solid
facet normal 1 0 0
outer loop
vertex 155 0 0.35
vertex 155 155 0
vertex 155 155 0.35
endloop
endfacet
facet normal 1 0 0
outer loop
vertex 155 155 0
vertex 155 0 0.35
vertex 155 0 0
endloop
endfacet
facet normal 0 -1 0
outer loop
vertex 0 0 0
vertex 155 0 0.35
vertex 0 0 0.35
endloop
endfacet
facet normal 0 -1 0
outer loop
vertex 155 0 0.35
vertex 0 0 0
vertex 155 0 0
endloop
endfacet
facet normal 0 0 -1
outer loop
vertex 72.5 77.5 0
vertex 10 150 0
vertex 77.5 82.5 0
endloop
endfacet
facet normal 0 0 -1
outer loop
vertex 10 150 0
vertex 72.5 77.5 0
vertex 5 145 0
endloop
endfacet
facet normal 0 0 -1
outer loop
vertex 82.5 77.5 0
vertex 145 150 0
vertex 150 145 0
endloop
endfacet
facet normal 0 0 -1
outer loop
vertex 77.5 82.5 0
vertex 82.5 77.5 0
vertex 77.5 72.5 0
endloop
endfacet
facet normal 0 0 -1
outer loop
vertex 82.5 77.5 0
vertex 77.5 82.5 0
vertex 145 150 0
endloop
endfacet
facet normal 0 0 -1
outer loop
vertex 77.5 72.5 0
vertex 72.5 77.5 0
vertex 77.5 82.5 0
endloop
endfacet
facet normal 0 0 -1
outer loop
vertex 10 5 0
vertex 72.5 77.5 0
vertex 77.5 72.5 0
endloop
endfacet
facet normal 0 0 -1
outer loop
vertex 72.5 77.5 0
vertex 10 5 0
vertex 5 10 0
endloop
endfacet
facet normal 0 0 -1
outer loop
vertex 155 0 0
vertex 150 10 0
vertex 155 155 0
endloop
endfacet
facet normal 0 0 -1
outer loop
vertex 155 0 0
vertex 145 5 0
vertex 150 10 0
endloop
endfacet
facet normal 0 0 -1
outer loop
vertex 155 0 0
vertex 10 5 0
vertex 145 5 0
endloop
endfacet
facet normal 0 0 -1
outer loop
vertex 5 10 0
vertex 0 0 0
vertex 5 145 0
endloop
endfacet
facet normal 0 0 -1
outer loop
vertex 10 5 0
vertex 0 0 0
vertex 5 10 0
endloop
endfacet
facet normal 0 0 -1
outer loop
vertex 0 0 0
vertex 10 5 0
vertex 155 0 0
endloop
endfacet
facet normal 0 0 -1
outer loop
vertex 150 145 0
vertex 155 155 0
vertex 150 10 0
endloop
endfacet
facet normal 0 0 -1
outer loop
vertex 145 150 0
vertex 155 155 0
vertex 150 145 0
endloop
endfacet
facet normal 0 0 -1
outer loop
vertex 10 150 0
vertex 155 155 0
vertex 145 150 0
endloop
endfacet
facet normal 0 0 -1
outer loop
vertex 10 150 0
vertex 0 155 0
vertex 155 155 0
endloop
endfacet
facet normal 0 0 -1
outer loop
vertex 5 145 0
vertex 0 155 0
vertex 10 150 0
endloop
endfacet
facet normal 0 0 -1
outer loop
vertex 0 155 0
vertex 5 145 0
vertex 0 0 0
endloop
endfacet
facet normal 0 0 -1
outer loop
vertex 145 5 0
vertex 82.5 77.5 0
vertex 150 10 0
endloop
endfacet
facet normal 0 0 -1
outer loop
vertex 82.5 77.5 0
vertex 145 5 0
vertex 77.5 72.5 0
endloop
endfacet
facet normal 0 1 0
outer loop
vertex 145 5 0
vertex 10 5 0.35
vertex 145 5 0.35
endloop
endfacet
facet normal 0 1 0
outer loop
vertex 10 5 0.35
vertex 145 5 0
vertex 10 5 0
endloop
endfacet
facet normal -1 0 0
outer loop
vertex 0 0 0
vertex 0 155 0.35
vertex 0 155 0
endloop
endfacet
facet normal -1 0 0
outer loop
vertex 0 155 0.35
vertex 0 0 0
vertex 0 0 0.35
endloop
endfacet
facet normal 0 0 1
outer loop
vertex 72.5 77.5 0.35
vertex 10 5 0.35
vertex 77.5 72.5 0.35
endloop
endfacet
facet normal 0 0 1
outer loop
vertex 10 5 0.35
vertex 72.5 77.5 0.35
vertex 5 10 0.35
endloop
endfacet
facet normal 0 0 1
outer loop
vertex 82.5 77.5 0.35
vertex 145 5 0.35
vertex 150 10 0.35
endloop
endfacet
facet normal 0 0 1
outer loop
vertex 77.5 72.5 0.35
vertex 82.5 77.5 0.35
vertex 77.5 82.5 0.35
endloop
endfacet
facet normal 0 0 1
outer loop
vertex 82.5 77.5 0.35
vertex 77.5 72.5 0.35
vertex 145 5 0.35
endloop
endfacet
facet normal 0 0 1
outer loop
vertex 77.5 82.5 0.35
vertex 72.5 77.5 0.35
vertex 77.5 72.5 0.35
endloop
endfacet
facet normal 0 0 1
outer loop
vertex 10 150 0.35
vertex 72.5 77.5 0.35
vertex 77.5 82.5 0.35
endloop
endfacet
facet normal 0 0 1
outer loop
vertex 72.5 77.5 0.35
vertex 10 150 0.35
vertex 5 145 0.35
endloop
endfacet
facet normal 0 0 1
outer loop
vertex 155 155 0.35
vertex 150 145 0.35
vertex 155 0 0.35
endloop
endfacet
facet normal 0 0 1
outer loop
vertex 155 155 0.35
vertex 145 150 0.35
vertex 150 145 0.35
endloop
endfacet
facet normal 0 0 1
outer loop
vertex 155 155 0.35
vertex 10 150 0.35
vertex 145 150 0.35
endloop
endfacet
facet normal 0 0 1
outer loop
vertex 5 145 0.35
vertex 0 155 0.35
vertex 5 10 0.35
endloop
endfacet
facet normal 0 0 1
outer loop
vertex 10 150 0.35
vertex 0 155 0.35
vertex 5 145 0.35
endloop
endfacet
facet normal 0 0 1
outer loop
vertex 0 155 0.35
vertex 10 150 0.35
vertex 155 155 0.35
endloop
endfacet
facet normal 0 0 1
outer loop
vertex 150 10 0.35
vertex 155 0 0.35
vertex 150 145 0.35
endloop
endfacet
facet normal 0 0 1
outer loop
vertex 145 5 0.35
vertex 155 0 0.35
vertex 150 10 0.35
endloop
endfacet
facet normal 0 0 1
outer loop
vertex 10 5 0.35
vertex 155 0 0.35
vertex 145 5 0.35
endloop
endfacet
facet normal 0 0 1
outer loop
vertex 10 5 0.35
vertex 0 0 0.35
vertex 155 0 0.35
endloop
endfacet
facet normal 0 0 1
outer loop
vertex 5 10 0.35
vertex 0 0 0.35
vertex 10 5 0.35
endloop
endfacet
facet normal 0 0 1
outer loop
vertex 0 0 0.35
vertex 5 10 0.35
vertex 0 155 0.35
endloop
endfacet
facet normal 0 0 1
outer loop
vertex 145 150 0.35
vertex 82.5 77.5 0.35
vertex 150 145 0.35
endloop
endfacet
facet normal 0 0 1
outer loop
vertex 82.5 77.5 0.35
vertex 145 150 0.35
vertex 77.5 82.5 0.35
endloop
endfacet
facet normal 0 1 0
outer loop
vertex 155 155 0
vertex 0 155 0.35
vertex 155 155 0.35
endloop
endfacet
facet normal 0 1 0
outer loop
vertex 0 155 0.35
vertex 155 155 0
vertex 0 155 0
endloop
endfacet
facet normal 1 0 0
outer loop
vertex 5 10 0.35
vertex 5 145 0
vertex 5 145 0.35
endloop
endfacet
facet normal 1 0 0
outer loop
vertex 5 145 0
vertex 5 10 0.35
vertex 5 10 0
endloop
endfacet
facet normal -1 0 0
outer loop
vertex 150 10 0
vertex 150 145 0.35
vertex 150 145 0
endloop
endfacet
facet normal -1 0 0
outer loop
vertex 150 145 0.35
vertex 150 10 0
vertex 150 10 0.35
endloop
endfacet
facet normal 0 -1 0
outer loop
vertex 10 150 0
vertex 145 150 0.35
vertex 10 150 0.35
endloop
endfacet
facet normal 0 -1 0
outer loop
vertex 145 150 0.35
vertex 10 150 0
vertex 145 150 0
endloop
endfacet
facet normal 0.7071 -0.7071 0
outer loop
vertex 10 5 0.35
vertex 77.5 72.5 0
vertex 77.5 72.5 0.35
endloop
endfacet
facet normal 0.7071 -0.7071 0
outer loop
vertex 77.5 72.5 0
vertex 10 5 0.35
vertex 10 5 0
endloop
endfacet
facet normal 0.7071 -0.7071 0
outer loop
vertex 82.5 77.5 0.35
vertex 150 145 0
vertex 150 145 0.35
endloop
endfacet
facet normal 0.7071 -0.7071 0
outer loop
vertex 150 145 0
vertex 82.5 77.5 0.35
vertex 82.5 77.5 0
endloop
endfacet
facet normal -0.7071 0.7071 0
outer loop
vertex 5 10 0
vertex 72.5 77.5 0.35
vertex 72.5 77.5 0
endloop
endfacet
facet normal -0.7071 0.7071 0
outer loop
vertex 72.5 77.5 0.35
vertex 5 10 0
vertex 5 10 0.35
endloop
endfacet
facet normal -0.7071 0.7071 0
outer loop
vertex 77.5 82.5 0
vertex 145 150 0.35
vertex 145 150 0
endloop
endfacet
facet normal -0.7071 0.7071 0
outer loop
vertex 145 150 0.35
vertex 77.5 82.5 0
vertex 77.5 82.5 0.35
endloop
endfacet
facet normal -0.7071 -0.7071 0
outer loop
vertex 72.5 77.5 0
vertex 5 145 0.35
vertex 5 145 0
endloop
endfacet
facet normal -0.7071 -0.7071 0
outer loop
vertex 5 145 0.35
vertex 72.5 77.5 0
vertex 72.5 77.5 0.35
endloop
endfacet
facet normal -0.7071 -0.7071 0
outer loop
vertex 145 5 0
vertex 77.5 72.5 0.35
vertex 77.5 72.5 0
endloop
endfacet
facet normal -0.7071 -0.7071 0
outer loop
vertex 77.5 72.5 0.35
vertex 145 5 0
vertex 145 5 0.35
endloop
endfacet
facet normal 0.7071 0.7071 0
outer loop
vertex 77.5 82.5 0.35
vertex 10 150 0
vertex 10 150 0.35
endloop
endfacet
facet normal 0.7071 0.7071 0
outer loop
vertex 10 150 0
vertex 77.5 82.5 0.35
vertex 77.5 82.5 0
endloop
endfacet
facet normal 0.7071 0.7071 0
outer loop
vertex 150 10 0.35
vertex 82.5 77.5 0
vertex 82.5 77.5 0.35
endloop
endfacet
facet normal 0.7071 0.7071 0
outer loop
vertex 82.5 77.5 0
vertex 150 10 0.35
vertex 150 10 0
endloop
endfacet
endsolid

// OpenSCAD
x= 150;
union(){
    //front side
    hull(){
    cube([5,5,0.35]);
    translate([x,0,0]) cube([5,5,0.35]);
    }

    //left
    hull(){
        
    cube([5,5,0.35]);
    translate([0,x,0]) cube([5,5,0.35]);
    }

    //rigth
    hull(){
    translate([x,x,0])
    cube([5,5,0.35]);
    translate([x,0,0]) cube([5,5,0.35]);
    }

    //rear

    hull(){
    translate([x,x,0])
    cube([5,5,0.35]);
    translate([0,x,0]) cube([5,5,0.35]);
    }

    //cross
    hull(){
    translate([x,x,0])
    cube([5,5,0.35]);
    translate([0,0,0]) cube([5,5,0.35]);
    }
    hull(){
    translate([0,x,0])
    cube([5,5,0.35]);
    translate([x,0,0]) cube([5,5,0.35]);
    }
}
